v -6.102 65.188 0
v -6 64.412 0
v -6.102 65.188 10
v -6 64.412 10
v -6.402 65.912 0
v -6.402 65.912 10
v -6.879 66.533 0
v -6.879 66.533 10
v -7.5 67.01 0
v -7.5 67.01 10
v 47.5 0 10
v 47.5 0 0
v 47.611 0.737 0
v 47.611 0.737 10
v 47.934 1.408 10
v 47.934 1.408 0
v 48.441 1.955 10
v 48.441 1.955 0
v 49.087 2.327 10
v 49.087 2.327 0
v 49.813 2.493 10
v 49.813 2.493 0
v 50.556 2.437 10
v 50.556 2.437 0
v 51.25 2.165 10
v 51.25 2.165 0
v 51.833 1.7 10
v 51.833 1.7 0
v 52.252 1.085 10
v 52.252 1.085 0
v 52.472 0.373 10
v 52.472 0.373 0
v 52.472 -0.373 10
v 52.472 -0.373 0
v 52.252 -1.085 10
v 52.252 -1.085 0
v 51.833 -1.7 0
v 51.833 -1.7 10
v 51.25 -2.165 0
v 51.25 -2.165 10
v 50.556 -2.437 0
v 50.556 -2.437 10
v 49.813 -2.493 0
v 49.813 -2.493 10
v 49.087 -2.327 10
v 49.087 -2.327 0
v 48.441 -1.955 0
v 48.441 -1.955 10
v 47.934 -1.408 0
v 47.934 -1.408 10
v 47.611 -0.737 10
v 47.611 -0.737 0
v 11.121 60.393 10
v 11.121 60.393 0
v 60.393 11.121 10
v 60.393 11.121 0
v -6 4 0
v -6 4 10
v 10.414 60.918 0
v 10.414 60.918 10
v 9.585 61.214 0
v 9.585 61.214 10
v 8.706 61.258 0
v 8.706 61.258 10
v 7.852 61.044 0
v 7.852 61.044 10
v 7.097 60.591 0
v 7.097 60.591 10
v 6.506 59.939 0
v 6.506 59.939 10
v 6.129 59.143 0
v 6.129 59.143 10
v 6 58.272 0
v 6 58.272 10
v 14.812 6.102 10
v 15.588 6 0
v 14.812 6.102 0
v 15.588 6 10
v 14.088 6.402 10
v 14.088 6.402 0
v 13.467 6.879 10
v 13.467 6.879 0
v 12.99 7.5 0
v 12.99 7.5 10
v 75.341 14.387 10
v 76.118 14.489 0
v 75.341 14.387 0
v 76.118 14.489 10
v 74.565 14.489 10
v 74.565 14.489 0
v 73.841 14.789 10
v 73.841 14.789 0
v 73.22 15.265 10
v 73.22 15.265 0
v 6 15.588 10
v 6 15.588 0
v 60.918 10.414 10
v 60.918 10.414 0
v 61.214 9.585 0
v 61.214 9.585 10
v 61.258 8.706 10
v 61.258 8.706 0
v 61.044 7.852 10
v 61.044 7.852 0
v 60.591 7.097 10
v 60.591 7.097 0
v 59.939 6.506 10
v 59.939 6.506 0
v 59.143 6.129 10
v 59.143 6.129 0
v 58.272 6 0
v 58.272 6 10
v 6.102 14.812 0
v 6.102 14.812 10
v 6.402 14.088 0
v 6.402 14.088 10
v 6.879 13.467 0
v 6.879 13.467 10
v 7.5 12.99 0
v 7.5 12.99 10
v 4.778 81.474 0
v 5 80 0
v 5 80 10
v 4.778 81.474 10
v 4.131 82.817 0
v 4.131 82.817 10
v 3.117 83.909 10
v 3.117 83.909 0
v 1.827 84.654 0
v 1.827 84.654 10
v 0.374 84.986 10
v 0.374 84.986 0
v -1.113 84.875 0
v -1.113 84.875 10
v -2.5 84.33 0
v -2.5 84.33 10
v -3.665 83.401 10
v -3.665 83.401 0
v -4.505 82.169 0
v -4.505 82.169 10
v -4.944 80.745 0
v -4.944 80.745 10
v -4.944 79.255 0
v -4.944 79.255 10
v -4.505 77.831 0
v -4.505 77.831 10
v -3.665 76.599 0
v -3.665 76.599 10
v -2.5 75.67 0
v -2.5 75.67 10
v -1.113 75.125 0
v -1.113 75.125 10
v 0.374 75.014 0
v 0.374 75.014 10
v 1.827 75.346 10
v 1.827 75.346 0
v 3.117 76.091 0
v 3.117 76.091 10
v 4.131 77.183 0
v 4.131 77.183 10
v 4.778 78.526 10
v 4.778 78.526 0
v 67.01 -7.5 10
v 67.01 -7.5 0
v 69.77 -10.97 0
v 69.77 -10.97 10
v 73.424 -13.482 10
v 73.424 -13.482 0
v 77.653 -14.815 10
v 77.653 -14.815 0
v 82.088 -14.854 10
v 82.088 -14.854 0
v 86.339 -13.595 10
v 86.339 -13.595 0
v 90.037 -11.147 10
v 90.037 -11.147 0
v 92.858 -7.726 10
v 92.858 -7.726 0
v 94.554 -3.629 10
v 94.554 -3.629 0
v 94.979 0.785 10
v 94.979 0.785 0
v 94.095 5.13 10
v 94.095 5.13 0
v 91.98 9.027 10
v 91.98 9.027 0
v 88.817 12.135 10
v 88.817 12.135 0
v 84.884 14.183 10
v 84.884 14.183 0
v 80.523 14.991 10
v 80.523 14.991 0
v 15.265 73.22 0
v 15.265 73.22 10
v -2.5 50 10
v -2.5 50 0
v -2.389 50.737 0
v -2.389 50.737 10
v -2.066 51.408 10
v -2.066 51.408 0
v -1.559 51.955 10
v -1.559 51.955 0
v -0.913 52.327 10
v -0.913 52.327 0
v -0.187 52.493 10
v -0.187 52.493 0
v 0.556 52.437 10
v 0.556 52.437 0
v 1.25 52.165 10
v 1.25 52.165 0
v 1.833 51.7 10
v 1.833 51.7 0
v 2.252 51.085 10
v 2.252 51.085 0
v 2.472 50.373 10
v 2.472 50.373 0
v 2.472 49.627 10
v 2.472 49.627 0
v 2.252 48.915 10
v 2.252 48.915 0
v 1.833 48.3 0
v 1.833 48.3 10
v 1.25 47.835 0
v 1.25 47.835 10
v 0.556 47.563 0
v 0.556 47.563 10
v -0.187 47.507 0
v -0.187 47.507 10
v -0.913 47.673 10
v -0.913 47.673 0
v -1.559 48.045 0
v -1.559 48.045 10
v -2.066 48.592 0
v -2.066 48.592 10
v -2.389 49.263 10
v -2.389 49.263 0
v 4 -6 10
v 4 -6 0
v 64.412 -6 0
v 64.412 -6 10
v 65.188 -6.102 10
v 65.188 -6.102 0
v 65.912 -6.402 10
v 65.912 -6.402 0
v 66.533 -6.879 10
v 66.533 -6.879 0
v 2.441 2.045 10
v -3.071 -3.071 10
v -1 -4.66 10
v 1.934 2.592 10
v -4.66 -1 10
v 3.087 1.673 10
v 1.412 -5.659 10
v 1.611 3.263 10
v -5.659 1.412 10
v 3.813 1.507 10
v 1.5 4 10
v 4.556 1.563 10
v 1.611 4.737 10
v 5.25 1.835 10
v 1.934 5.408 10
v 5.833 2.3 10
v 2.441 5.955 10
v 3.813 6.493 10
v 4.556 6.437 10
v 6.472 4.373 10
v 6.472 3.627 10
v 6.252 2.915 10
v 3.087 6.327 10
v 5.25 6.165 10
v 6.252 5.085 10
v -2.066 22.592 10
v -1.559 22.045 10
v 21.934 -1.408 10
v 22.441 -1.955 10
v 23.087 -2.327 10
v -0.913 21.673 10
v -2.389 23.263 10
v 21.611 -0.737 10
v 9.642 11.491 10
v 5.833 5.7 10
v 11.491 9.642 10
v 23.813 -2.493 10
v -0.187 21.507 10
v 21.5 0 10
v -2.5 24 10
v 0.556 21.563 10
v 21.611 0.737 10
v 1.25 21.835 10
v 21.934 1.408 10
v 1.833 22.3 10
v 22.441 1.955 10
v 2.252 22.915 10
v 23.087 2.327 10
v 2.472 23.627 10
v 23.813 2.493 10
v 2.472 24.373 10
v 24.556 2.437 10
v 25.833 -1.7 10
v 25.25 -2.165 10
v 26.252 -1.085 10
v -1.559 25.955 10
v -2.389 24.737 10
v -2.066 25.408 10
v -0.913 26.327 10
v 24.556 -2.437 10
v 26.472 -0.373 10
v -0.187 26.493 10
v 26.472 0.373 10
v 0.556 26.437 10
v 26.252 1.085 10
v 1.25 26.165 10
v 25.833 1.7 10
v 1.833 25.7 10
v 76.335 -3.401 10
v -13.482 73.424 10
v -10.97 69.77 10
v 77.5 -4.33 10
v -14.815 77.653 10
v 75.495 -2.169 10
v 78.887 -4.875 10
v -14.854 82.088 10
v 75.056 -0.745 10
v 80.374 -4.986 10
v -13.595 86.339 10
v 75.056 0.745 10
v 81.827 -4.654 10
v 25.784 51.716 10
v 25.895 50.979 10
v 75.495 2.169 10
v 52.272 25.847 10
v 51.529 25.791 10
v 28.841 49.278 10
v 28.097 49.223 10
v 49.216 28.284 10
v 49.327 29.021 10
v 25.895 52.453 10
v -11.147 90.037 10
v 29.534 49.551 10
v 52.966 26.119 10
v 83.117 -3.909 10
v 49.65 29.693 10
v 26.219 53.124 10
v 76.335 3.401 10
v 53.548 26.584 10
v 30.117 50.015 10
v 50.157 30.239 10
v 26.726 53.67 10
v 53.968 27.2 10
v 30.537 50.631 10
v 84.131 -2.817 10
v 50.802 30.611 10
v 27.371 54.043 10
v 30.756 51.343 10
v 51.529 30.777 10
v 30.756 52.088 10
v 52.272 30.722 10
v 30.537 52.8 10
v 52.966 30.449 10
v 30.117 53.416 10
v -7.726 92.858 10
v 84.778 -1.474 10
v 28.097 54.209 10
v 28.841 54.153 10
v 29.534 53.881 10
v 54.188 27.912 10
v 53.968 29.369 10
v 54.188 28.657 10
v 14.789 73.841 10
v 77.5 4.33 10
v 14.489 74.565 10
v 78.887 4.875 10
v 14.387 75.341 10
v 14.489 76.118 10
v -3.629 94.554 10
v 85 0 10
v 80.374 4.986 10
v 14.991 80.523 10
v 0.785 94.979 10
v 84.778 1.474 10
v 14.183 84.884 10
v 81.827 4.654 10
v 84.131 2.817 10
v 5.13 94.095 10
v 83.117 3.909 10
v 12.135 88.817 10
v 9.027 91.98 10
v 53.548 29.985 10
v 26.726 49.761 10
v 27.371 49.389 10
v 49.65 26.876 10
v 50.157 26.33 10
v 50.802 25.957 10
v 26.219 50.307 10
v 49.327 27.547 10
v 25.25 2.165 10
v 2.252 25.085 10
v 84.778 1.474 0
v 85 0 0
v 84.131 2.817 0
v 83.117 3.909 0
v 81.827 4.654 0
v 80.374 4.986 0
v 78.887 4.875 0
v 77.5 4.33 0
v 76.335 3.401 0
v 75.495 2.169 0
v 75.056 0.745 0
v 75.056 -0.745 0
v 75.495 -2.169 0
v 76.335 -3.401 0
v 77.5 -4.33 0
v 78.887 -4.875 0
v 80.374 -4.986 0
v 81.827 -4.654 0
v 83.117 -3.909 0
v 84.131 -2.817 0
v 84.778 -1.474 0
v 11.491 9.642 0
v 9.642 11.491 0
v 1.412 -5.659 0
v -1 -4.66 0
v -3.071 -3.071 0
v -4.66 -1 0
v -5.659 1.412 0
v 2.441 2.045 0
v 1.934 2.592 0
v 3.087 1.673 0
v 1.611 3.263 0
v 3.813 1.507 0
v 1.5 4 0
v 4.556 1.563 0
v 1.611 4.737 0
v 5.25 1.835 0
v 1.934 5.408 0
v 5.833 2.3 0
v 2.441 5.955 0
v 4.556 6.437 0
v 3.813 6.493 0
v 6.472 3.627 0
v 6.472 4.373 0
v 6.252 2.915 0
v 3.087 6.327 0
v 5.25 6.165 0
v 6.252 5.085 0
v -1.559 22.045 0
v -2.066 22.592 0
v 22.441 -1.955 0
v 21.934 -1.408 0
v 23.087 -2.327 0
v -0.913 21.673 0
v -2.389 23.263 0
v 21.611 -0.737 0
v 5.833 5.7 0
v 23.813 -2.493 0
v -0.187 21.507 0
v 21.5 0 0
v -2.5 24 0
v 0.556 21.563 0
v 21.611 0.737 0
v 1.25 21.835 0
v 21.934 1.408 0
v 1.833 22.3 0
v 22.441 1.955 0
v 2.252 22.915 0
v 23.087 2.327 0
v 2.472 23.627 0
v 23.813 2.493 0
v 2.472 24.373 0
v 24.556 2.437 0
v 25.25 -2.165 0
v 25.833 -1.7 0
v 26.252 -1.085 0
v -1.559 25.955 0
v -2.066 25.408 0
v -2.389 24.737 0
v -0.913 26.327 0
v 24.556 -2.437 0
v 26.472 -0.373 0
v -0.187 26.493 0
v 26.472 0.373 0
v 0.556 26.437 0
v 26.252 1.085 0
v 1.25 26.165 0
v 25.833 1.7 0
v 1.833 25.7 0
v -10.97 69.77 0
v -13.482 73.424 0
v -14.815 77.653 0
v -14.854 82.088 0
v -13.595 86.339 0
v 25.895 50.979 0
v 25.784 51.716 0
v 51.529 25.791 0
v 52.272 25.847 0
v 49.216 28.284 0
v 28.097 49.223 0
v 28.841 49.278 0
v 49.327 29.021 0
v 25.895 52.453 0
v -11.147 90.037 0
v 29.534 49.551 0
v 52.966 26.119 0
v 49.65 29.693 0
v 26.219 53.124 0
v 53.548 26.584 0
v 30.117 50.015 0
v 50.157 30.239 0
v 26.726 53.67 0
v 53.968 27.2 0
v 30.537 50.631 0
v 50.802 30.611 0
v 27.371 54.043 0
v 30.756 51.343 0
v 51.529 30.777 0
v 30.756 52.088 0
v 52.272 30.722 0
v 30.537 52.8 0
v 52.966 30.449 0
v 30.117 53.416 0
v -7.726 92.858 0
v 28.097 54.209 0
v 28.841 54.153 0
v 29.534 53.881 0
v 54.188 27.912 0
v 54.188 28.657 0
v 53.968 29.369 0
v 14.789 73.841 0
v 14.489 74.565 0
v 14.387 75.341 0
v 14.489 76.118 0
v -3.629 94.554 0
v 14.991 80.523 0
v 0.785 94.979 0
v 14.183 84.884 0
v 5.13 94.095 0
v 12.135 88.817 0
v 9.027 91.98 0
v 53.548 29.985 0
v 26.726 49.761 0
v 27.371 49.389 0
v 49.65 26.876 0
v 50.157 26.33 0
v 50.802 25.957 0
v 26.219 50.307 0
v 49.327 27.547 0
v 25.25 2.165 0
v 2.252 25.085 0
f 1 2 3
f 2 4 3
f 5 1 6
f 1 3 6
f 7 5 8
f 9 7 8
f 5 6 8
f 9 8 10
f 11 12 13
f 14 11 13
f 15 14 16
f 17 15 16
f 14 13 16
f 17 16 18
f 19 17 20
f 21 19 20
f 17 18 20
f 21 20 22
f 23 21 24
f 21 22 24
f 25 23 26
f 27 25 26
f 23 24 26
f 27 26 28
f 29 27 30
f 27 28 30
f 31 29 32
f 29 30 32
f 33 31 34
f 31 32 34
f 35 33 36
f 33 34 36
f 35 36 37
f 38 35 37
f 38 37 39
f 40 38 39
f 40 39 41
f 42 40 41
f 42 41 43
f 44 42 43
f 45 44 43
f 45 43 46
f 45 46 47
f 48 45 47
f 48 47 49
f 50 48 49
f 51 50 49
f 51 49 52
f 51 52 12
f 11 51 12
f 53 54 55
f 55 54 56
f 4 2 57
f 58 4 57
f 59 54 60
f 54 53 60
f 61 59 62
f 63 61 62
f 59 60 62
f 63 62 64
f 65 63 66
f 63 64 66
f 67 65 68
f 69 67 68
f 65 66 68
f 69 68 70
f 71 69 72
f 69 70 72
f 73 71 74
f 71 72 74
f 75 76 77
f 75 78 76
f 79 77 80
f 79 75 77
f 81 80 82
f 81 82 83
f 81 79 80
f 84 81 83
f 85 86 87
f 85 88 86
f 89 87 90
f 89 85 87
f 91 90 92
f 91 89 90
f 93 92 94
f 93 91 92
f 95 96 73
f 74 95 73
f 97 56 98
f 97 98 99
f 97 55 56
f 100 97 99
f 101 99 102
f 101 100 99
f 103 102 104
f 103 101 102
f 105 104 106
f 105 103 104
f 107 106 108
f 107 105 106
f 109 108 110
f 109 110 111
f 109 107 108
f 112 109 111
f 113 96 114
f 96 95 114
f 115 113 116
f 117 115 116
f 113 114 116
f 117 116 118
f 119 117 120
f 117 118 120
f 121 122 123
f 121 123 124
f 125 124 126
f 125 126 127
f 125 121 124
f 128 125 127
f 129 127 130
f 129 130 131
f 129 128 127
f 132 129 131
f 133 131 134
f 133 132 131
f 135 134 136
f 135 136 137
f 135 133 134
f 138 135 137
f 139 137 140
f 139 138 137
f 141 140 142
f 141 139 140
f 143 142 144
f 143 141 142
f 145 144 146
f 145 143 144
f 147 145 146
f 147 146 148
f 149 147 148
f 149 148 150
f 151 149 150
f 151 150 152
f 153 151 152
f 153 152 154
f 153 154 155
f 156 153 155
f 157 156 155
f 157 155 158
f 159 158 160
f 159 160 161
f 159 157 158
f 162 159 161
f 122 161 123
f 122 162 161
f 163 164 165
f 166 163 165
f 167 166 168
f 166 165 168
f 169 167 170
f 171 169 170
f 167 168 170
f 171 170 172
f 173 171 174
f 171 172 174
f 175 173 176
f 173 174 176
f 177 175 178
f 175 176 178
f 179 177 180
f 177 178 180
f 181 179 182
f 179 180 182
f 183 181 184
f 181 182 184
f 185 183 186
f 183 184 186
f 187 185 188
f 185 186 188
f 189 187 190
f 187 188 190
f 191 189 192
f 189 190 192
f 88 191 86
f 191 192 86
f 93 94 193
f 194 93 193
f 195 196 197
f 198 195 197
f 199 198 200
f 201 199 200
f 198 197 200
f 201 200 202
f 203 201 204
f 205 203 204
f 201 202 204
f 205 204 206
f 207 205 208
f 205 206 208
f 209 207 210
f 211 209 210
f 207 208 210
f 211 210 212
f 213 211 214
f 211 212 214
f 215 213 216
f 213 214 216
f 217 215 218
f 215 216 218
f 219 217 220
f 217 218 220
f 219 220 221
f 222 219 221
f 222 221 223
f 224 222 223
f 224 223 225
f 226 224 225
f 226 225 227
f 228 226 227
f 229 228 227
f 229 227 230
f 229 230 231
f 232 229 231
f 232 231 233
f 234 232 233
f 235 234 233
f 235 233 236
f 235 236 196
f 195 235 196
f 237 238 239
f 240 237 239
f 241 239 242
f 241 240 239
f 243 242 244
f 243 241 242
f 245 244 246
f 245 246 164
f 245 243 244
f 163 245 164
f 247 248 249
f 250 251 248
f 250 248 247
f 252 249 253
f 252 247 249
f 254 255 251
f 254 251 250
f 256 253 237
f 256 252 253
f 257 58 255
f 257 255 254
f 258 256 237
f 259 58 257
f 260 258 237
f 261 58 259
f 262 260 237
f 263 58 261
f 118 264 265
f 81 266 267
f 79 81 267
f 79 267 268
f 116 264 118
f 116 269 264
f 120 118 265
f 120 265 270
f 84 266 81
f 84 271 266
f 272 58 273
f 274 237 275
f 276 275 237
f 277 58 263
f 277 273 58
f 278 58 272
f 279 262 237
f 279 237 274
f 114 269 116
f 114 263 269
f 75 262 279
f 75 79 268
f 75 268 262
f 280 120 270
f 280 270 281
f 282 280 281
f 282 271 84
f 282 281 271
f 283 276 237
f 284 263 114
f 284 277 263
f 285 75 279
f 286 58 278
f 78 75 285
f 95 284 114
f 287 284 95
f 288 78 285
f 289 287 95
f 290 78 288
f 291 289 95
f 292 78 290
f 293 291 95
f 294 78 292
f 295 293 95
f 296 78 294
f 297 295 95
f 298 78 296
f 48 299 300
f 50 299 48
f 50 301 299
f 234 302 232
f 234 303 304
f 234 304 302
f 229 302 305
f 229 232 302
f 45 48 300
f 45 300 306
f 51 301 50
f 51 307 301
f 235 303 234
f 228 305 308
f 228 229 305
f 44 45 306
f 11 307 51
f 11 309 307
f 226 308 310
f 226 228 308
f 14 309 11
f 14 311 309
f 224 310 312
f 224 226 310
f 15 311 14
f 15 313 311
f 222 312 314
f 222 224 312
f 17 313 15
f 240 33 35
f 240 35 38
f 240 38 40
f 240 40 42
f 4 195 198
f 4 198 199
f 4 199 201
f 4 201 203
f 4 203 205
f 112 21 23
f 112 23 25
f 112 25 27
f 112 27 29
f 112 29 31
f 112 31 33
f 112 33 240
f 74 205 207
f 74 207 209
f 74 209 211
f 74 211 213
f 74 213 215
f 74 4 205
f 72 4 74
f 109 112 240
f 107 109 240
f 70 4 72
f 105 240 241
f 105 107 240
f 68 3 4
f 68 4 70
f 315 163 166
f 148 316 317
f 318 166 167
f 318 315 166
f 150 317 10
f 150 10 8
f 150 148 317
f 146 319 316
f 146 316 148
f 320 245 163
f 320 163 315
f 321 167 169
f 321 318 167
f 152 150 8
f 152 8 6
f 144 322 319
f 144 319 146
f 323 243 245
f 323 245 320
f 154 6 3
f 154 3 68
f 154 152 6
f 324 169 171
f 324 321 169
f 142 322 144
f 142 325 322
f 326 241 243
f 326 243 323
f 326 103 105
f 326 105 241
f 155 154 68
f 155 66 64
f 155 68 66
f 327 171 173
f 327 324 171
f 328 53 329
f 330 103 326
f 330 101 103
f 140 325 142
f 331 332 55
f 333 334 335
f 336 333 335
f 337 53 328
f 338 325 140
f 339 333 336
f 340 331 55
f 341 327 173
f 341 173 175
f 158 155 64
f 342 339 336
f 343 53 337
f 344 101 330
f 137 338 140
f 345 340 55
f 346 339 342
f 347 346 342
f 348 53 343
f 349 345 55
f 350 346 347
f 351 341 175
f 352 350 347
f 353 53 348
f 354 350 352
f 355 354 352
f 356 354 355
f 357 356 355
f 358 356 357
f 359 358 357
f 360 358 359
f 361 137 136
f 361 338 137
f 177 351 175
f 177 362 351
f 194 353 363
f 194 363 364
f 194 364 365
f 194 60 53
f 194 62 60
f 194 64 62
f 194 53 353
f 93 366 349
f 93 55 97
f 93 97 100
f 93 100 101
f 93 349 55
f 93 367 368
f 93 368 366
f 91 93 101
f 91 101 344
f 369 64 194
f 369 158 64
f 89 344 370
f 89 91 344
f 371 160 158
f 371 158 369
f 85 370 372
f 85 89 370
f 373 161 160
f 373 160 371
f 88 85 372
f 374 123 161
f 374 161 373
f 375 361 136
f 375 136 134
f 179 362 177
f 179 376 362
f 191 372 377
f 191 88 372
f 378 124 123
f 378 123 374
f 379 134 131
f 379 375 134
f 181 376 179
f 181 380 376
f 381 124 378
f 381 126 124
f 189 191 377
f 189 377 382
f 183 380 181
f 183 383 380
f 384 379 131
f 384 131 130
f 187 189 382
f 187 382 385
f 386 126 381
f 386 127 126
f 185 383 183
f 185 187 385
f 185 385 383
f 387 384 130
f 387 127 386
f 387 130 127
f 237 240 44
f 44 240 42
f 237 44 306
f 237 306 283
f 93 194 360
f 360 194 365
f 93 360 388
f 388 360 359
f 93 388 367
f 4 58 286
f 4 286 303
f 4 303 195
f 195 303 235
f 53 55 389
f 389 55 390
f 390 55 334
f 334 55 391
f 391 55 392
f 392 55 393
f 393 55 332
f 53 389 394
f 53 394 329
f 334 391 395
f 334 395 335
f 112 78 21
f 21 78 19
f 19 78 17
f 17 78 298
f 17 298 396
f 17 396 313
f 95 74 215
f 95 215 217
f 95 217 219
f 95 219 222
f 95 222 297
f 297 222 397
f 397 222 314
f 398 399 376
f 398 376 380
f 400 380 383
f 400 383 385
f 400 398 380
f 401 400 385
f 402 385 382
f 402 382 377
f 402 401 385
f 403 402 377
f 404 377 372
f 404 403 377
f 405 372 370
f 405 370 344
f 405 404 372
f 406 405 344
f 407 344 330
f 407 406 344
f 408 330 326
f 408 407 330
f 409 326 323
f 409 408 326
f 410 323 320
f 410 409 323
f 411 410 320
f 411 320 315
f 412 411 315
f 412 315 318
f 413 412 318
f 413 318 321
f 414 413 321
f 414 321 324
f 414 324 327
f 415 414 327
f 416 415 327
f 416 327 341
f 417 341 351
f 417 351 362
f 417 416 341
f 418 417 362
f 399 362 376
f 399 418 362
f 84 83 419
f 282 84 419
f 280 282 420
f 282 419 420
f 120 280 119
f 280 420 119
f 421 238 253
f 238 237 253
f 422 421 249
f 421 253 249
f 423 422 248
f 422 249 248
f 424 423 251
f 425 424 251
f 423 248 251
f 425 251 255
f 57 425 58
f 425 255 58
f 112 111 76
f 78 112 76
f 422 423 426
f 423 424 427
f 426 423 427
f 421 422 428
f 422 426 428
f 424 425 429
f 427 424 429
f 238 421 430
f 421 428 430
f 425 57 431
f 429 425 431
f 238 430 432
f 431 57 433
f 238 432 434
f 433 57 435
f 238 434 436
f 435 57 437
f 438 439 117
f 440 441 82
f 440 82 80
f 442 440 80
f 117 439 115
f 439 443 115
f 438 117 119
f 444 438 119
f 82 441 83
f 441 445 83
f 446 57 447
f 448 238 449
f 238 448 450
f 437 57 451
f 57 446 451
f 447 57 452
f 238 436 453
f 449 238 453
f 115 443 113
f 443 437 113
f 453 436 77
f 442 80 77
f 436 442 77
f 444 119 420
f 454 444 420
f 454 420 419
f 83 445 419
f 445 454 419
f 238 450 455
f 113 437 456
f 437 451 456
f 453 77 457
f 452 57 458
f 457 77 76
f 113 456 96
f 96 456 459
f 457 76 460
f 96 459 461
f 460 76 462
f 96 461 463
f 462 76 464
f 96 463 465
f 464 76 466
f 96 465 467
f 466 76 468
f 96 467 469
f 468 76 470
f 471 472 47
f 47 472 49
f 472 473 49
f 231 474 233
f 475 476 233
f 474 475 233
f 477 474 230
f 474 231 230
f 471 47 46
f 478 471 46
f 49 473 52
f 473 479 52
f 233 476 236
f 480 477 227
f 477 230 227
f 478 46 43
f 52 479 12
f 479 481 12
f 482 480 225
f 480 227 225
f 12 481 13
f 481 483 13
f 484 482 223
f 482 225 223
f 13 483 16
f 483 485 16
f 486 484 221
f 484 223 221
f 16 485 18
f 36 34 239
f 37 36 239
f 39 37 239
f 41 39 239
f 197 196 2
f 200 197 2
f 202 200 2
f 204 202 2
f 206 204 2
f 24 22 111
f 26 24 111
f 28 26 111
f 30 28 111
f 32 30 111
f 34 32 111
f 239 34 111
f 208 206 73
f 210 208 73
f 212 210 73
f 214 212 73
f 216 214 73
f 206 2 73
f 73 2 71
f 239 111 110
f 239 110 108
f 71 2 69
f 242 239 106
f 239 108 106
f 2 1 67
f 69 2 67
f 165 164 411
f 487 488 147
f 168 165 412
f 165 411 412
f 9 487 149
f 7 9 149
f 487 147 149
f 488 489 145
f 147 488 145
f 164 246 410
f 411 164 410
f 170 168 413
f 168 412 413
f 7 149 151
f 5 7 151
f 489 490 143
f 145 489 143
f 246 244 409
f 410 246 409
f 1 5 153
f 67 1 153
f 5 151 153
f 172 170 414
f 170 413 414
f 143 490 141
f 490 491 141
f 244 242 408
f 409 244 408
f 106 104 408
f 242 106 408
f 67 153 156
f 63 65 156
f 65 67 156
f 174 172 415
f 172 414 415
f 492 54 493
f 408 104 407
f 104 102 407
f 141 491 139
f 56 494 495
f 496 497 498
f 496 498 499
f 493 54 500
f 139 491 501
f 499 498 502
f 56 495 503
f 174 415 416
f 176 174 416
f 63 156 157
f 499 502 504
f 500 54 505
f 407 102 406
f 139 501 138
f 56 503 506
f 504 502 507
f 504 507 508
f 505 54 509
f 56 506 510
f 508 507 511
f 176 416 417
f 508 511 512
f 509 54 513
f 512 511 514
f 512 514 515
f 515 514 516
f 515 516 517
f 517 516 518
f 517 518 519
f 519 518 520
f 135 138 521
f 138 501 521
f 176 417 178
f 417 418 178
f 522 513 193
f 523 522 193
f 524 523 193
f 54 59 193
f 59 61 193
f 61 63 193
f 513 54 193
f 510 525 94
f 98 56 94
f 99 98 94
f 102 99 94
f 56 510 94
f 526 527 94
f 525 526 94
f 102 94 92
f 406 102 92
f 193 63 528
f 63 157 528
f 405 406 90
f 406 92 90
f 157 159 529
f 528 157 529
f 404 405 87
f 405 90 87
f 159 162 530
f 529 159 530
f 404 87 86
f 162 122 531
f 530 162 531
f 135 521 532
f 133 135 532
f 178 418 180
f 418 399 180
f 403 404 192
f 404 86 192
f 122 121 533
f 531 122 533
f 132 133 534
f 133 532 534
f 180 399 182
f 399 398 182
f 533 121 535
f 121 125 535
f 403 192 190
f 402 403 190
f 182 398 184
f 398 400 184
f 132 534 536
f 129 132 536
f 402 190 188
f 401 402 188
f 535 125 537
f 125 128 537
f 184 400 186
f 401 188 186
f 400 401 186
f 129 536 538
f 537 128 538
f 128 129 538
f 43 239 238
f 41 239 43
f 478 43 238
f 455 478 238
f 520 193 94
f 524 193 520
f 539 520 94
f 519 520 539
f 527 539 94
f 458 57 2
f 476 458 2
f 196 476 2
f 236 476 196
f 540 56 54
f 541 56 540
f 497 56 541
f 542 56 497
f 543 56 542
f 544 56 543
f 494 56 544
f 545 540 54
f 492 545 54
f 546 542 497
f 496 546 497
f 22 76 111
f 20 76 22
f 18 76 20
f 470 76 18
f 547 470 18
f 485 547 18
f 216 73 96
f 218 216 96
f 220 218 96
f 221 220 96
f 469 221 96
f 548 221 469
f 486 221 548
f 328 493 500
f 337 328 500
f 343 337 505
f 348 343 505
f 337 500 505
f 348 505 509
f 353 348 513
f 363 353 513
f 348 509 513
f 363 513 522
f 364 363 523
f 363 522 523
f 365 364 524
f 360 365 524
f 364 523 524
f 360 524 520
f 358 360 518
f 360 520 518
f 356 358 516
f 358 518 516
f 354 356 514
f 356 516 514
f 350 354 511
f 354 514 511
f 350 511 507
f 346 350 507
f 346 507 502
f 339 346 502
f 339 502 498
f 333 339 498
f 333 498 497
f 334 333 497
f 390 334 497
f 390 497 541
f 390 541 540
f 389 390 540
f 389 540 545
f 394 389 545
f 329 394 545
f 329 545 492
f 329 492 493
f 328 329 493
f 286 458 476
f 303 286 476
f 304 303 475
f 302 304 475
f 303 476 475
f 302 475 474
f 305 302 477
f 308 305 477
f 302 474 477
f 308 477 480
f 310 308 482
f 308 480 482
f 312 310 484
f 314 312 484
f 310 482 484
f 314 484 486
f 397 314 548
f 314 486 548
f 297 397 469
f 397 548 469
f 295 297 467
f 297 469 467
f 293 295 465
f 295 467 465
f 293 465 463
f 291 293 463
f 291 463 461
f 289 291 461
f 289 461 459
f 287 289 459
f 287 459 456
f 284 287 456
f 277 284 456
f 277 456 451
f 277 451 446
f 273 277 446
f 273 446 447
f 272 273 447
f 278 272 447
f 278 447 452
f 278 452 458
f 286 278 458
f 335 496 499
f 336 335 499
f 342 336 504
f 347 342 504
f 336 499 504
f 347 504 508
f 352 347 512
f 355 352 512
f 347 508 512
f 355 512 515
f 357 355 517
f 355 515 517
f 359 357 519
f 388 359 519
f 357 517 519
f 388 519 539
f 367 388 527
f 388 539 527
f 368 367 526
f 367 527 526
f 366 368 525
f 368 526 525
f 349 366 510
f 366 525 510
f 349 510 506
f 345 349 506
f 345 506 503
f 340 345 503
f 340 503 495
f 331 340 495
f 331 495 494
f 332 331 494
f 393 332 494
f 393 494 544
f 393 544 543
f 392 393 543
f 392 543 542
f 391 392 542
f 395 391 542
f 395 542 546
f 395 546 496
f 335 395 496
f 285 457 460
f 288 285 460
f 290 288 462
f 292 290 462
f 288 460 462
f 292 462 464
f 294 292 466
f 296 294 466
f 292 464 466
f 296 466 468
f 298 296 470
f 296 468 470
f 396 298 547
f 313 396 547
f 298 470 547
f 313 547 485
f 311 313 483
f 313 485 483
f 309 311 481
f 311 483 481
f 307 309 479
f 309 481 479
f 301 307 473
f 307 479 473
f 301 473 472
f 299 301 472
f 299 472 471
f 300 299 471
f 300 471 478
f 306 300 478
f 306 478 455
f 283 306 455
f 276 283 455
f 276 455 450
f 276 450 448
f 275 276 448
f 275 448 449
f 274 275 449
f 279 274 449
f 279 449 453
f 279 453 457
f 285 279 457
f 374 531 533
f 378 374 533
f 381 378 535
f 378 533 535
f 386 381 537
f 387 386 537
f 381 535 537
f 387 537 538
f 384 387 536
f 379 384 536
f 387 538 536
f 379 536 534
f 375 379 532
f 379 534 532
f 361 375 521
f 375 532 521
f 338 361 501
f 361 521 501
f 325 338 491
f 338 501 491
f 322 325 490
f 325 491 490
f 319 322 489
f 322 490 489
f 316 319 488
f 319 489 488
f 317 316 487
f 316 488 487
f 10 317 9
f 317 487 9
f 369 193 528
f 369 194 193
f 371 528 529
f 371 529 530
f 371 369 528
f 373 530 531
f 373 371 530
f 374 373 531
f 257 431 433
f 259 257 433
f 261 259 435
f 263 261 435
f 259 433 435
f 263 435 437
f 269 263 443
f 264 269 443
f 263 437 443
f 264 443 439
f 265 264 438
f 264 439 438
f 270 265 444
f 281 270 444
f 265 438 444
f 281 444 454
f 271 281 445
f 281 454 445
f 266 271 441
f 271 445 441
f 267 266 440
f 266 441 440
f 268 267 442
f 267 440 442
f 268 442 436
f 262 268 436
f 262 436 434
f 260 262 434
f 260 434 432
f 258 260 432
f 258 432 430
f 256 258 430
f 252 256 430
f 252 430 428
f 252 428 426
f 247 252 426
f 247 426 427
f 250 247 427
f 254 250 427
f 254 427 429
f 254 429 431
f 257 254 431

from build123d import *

# Parameters (mm, degrees)
F0_R     = 5
F1_DEPTH = 10
F2_R     = 10
F3_R     = 3
F5_D     = 5


with BuildPart() as f1:
    # F0 (on Top) → F1 (new body)
    with BuildSketch(Plane.XY):
        with BuildLine():
            Line((-6, -6), (66.252273, -6))
            ThreePointArc((66.252273, -6), (93.858193, -5.740251), (74.52153, 13.963752))
            Line((74.52153, 13.963752), (13.963752, 74.52153))
            ThreePointArc((13.963752, 74.52153), (-5.740251, 93.858193), (-6, 66.252273))
            Line((-6, 66.252273), (-6, -6))
        make_face()
        with BuildLine():
            Line((65.514719, 6), (13.747727, 6))
            ThreePointArc((13.747727, 6), (10.606602, 10.606602), (6, 13.747727))
            Line((6, 13.747727), (6, 65.514719))
            Line((6, 65.514719), (65.514719, 6))
        make_face(mode=Mode.SUBTRACT)
        with Locations((80, 0)):
            Circle(F0_R, mode=Mode.SUBTRACT)
        with Locations((0, 80)):
            Circle(F0_R, mode=Mode.SUBTRACT)
    extrude(amount=F1_DEPTH)

    # F2
    f2_edges = [f1.edges().sort_by_distance(p)[0] for p in [
        (-6, -6, 5),
    ]]
    fillet(f2_edges, radius=F2_R)

    # F3
    f3_edges = [f1.edges().sort_by_distance(p)[0] for p in [
        (13.963752, 74.52153, 5),
        (74.52153, 13.963752, 5),
        (66.252273, -6, 5),
        (-6, 66.252273, 5),
        (65.514719, 6, 5),
        (6, 65.514719, 5),
        (6, 13.747727, 5),
        (13.747727, 6, 5),
    ]]
    fillet(f3_edges, radius=F3_R)

    # F5 (through all)
    with Locations(Plane.XY.offset(10)):
        with Locations((0, 50), (0, 24), (28.284271, 51.715729), (51.715729, 28.284271), (50, 0), (24, 0), (4, 4)):
            Hole(F5_D / 2)


solid = f1.part
